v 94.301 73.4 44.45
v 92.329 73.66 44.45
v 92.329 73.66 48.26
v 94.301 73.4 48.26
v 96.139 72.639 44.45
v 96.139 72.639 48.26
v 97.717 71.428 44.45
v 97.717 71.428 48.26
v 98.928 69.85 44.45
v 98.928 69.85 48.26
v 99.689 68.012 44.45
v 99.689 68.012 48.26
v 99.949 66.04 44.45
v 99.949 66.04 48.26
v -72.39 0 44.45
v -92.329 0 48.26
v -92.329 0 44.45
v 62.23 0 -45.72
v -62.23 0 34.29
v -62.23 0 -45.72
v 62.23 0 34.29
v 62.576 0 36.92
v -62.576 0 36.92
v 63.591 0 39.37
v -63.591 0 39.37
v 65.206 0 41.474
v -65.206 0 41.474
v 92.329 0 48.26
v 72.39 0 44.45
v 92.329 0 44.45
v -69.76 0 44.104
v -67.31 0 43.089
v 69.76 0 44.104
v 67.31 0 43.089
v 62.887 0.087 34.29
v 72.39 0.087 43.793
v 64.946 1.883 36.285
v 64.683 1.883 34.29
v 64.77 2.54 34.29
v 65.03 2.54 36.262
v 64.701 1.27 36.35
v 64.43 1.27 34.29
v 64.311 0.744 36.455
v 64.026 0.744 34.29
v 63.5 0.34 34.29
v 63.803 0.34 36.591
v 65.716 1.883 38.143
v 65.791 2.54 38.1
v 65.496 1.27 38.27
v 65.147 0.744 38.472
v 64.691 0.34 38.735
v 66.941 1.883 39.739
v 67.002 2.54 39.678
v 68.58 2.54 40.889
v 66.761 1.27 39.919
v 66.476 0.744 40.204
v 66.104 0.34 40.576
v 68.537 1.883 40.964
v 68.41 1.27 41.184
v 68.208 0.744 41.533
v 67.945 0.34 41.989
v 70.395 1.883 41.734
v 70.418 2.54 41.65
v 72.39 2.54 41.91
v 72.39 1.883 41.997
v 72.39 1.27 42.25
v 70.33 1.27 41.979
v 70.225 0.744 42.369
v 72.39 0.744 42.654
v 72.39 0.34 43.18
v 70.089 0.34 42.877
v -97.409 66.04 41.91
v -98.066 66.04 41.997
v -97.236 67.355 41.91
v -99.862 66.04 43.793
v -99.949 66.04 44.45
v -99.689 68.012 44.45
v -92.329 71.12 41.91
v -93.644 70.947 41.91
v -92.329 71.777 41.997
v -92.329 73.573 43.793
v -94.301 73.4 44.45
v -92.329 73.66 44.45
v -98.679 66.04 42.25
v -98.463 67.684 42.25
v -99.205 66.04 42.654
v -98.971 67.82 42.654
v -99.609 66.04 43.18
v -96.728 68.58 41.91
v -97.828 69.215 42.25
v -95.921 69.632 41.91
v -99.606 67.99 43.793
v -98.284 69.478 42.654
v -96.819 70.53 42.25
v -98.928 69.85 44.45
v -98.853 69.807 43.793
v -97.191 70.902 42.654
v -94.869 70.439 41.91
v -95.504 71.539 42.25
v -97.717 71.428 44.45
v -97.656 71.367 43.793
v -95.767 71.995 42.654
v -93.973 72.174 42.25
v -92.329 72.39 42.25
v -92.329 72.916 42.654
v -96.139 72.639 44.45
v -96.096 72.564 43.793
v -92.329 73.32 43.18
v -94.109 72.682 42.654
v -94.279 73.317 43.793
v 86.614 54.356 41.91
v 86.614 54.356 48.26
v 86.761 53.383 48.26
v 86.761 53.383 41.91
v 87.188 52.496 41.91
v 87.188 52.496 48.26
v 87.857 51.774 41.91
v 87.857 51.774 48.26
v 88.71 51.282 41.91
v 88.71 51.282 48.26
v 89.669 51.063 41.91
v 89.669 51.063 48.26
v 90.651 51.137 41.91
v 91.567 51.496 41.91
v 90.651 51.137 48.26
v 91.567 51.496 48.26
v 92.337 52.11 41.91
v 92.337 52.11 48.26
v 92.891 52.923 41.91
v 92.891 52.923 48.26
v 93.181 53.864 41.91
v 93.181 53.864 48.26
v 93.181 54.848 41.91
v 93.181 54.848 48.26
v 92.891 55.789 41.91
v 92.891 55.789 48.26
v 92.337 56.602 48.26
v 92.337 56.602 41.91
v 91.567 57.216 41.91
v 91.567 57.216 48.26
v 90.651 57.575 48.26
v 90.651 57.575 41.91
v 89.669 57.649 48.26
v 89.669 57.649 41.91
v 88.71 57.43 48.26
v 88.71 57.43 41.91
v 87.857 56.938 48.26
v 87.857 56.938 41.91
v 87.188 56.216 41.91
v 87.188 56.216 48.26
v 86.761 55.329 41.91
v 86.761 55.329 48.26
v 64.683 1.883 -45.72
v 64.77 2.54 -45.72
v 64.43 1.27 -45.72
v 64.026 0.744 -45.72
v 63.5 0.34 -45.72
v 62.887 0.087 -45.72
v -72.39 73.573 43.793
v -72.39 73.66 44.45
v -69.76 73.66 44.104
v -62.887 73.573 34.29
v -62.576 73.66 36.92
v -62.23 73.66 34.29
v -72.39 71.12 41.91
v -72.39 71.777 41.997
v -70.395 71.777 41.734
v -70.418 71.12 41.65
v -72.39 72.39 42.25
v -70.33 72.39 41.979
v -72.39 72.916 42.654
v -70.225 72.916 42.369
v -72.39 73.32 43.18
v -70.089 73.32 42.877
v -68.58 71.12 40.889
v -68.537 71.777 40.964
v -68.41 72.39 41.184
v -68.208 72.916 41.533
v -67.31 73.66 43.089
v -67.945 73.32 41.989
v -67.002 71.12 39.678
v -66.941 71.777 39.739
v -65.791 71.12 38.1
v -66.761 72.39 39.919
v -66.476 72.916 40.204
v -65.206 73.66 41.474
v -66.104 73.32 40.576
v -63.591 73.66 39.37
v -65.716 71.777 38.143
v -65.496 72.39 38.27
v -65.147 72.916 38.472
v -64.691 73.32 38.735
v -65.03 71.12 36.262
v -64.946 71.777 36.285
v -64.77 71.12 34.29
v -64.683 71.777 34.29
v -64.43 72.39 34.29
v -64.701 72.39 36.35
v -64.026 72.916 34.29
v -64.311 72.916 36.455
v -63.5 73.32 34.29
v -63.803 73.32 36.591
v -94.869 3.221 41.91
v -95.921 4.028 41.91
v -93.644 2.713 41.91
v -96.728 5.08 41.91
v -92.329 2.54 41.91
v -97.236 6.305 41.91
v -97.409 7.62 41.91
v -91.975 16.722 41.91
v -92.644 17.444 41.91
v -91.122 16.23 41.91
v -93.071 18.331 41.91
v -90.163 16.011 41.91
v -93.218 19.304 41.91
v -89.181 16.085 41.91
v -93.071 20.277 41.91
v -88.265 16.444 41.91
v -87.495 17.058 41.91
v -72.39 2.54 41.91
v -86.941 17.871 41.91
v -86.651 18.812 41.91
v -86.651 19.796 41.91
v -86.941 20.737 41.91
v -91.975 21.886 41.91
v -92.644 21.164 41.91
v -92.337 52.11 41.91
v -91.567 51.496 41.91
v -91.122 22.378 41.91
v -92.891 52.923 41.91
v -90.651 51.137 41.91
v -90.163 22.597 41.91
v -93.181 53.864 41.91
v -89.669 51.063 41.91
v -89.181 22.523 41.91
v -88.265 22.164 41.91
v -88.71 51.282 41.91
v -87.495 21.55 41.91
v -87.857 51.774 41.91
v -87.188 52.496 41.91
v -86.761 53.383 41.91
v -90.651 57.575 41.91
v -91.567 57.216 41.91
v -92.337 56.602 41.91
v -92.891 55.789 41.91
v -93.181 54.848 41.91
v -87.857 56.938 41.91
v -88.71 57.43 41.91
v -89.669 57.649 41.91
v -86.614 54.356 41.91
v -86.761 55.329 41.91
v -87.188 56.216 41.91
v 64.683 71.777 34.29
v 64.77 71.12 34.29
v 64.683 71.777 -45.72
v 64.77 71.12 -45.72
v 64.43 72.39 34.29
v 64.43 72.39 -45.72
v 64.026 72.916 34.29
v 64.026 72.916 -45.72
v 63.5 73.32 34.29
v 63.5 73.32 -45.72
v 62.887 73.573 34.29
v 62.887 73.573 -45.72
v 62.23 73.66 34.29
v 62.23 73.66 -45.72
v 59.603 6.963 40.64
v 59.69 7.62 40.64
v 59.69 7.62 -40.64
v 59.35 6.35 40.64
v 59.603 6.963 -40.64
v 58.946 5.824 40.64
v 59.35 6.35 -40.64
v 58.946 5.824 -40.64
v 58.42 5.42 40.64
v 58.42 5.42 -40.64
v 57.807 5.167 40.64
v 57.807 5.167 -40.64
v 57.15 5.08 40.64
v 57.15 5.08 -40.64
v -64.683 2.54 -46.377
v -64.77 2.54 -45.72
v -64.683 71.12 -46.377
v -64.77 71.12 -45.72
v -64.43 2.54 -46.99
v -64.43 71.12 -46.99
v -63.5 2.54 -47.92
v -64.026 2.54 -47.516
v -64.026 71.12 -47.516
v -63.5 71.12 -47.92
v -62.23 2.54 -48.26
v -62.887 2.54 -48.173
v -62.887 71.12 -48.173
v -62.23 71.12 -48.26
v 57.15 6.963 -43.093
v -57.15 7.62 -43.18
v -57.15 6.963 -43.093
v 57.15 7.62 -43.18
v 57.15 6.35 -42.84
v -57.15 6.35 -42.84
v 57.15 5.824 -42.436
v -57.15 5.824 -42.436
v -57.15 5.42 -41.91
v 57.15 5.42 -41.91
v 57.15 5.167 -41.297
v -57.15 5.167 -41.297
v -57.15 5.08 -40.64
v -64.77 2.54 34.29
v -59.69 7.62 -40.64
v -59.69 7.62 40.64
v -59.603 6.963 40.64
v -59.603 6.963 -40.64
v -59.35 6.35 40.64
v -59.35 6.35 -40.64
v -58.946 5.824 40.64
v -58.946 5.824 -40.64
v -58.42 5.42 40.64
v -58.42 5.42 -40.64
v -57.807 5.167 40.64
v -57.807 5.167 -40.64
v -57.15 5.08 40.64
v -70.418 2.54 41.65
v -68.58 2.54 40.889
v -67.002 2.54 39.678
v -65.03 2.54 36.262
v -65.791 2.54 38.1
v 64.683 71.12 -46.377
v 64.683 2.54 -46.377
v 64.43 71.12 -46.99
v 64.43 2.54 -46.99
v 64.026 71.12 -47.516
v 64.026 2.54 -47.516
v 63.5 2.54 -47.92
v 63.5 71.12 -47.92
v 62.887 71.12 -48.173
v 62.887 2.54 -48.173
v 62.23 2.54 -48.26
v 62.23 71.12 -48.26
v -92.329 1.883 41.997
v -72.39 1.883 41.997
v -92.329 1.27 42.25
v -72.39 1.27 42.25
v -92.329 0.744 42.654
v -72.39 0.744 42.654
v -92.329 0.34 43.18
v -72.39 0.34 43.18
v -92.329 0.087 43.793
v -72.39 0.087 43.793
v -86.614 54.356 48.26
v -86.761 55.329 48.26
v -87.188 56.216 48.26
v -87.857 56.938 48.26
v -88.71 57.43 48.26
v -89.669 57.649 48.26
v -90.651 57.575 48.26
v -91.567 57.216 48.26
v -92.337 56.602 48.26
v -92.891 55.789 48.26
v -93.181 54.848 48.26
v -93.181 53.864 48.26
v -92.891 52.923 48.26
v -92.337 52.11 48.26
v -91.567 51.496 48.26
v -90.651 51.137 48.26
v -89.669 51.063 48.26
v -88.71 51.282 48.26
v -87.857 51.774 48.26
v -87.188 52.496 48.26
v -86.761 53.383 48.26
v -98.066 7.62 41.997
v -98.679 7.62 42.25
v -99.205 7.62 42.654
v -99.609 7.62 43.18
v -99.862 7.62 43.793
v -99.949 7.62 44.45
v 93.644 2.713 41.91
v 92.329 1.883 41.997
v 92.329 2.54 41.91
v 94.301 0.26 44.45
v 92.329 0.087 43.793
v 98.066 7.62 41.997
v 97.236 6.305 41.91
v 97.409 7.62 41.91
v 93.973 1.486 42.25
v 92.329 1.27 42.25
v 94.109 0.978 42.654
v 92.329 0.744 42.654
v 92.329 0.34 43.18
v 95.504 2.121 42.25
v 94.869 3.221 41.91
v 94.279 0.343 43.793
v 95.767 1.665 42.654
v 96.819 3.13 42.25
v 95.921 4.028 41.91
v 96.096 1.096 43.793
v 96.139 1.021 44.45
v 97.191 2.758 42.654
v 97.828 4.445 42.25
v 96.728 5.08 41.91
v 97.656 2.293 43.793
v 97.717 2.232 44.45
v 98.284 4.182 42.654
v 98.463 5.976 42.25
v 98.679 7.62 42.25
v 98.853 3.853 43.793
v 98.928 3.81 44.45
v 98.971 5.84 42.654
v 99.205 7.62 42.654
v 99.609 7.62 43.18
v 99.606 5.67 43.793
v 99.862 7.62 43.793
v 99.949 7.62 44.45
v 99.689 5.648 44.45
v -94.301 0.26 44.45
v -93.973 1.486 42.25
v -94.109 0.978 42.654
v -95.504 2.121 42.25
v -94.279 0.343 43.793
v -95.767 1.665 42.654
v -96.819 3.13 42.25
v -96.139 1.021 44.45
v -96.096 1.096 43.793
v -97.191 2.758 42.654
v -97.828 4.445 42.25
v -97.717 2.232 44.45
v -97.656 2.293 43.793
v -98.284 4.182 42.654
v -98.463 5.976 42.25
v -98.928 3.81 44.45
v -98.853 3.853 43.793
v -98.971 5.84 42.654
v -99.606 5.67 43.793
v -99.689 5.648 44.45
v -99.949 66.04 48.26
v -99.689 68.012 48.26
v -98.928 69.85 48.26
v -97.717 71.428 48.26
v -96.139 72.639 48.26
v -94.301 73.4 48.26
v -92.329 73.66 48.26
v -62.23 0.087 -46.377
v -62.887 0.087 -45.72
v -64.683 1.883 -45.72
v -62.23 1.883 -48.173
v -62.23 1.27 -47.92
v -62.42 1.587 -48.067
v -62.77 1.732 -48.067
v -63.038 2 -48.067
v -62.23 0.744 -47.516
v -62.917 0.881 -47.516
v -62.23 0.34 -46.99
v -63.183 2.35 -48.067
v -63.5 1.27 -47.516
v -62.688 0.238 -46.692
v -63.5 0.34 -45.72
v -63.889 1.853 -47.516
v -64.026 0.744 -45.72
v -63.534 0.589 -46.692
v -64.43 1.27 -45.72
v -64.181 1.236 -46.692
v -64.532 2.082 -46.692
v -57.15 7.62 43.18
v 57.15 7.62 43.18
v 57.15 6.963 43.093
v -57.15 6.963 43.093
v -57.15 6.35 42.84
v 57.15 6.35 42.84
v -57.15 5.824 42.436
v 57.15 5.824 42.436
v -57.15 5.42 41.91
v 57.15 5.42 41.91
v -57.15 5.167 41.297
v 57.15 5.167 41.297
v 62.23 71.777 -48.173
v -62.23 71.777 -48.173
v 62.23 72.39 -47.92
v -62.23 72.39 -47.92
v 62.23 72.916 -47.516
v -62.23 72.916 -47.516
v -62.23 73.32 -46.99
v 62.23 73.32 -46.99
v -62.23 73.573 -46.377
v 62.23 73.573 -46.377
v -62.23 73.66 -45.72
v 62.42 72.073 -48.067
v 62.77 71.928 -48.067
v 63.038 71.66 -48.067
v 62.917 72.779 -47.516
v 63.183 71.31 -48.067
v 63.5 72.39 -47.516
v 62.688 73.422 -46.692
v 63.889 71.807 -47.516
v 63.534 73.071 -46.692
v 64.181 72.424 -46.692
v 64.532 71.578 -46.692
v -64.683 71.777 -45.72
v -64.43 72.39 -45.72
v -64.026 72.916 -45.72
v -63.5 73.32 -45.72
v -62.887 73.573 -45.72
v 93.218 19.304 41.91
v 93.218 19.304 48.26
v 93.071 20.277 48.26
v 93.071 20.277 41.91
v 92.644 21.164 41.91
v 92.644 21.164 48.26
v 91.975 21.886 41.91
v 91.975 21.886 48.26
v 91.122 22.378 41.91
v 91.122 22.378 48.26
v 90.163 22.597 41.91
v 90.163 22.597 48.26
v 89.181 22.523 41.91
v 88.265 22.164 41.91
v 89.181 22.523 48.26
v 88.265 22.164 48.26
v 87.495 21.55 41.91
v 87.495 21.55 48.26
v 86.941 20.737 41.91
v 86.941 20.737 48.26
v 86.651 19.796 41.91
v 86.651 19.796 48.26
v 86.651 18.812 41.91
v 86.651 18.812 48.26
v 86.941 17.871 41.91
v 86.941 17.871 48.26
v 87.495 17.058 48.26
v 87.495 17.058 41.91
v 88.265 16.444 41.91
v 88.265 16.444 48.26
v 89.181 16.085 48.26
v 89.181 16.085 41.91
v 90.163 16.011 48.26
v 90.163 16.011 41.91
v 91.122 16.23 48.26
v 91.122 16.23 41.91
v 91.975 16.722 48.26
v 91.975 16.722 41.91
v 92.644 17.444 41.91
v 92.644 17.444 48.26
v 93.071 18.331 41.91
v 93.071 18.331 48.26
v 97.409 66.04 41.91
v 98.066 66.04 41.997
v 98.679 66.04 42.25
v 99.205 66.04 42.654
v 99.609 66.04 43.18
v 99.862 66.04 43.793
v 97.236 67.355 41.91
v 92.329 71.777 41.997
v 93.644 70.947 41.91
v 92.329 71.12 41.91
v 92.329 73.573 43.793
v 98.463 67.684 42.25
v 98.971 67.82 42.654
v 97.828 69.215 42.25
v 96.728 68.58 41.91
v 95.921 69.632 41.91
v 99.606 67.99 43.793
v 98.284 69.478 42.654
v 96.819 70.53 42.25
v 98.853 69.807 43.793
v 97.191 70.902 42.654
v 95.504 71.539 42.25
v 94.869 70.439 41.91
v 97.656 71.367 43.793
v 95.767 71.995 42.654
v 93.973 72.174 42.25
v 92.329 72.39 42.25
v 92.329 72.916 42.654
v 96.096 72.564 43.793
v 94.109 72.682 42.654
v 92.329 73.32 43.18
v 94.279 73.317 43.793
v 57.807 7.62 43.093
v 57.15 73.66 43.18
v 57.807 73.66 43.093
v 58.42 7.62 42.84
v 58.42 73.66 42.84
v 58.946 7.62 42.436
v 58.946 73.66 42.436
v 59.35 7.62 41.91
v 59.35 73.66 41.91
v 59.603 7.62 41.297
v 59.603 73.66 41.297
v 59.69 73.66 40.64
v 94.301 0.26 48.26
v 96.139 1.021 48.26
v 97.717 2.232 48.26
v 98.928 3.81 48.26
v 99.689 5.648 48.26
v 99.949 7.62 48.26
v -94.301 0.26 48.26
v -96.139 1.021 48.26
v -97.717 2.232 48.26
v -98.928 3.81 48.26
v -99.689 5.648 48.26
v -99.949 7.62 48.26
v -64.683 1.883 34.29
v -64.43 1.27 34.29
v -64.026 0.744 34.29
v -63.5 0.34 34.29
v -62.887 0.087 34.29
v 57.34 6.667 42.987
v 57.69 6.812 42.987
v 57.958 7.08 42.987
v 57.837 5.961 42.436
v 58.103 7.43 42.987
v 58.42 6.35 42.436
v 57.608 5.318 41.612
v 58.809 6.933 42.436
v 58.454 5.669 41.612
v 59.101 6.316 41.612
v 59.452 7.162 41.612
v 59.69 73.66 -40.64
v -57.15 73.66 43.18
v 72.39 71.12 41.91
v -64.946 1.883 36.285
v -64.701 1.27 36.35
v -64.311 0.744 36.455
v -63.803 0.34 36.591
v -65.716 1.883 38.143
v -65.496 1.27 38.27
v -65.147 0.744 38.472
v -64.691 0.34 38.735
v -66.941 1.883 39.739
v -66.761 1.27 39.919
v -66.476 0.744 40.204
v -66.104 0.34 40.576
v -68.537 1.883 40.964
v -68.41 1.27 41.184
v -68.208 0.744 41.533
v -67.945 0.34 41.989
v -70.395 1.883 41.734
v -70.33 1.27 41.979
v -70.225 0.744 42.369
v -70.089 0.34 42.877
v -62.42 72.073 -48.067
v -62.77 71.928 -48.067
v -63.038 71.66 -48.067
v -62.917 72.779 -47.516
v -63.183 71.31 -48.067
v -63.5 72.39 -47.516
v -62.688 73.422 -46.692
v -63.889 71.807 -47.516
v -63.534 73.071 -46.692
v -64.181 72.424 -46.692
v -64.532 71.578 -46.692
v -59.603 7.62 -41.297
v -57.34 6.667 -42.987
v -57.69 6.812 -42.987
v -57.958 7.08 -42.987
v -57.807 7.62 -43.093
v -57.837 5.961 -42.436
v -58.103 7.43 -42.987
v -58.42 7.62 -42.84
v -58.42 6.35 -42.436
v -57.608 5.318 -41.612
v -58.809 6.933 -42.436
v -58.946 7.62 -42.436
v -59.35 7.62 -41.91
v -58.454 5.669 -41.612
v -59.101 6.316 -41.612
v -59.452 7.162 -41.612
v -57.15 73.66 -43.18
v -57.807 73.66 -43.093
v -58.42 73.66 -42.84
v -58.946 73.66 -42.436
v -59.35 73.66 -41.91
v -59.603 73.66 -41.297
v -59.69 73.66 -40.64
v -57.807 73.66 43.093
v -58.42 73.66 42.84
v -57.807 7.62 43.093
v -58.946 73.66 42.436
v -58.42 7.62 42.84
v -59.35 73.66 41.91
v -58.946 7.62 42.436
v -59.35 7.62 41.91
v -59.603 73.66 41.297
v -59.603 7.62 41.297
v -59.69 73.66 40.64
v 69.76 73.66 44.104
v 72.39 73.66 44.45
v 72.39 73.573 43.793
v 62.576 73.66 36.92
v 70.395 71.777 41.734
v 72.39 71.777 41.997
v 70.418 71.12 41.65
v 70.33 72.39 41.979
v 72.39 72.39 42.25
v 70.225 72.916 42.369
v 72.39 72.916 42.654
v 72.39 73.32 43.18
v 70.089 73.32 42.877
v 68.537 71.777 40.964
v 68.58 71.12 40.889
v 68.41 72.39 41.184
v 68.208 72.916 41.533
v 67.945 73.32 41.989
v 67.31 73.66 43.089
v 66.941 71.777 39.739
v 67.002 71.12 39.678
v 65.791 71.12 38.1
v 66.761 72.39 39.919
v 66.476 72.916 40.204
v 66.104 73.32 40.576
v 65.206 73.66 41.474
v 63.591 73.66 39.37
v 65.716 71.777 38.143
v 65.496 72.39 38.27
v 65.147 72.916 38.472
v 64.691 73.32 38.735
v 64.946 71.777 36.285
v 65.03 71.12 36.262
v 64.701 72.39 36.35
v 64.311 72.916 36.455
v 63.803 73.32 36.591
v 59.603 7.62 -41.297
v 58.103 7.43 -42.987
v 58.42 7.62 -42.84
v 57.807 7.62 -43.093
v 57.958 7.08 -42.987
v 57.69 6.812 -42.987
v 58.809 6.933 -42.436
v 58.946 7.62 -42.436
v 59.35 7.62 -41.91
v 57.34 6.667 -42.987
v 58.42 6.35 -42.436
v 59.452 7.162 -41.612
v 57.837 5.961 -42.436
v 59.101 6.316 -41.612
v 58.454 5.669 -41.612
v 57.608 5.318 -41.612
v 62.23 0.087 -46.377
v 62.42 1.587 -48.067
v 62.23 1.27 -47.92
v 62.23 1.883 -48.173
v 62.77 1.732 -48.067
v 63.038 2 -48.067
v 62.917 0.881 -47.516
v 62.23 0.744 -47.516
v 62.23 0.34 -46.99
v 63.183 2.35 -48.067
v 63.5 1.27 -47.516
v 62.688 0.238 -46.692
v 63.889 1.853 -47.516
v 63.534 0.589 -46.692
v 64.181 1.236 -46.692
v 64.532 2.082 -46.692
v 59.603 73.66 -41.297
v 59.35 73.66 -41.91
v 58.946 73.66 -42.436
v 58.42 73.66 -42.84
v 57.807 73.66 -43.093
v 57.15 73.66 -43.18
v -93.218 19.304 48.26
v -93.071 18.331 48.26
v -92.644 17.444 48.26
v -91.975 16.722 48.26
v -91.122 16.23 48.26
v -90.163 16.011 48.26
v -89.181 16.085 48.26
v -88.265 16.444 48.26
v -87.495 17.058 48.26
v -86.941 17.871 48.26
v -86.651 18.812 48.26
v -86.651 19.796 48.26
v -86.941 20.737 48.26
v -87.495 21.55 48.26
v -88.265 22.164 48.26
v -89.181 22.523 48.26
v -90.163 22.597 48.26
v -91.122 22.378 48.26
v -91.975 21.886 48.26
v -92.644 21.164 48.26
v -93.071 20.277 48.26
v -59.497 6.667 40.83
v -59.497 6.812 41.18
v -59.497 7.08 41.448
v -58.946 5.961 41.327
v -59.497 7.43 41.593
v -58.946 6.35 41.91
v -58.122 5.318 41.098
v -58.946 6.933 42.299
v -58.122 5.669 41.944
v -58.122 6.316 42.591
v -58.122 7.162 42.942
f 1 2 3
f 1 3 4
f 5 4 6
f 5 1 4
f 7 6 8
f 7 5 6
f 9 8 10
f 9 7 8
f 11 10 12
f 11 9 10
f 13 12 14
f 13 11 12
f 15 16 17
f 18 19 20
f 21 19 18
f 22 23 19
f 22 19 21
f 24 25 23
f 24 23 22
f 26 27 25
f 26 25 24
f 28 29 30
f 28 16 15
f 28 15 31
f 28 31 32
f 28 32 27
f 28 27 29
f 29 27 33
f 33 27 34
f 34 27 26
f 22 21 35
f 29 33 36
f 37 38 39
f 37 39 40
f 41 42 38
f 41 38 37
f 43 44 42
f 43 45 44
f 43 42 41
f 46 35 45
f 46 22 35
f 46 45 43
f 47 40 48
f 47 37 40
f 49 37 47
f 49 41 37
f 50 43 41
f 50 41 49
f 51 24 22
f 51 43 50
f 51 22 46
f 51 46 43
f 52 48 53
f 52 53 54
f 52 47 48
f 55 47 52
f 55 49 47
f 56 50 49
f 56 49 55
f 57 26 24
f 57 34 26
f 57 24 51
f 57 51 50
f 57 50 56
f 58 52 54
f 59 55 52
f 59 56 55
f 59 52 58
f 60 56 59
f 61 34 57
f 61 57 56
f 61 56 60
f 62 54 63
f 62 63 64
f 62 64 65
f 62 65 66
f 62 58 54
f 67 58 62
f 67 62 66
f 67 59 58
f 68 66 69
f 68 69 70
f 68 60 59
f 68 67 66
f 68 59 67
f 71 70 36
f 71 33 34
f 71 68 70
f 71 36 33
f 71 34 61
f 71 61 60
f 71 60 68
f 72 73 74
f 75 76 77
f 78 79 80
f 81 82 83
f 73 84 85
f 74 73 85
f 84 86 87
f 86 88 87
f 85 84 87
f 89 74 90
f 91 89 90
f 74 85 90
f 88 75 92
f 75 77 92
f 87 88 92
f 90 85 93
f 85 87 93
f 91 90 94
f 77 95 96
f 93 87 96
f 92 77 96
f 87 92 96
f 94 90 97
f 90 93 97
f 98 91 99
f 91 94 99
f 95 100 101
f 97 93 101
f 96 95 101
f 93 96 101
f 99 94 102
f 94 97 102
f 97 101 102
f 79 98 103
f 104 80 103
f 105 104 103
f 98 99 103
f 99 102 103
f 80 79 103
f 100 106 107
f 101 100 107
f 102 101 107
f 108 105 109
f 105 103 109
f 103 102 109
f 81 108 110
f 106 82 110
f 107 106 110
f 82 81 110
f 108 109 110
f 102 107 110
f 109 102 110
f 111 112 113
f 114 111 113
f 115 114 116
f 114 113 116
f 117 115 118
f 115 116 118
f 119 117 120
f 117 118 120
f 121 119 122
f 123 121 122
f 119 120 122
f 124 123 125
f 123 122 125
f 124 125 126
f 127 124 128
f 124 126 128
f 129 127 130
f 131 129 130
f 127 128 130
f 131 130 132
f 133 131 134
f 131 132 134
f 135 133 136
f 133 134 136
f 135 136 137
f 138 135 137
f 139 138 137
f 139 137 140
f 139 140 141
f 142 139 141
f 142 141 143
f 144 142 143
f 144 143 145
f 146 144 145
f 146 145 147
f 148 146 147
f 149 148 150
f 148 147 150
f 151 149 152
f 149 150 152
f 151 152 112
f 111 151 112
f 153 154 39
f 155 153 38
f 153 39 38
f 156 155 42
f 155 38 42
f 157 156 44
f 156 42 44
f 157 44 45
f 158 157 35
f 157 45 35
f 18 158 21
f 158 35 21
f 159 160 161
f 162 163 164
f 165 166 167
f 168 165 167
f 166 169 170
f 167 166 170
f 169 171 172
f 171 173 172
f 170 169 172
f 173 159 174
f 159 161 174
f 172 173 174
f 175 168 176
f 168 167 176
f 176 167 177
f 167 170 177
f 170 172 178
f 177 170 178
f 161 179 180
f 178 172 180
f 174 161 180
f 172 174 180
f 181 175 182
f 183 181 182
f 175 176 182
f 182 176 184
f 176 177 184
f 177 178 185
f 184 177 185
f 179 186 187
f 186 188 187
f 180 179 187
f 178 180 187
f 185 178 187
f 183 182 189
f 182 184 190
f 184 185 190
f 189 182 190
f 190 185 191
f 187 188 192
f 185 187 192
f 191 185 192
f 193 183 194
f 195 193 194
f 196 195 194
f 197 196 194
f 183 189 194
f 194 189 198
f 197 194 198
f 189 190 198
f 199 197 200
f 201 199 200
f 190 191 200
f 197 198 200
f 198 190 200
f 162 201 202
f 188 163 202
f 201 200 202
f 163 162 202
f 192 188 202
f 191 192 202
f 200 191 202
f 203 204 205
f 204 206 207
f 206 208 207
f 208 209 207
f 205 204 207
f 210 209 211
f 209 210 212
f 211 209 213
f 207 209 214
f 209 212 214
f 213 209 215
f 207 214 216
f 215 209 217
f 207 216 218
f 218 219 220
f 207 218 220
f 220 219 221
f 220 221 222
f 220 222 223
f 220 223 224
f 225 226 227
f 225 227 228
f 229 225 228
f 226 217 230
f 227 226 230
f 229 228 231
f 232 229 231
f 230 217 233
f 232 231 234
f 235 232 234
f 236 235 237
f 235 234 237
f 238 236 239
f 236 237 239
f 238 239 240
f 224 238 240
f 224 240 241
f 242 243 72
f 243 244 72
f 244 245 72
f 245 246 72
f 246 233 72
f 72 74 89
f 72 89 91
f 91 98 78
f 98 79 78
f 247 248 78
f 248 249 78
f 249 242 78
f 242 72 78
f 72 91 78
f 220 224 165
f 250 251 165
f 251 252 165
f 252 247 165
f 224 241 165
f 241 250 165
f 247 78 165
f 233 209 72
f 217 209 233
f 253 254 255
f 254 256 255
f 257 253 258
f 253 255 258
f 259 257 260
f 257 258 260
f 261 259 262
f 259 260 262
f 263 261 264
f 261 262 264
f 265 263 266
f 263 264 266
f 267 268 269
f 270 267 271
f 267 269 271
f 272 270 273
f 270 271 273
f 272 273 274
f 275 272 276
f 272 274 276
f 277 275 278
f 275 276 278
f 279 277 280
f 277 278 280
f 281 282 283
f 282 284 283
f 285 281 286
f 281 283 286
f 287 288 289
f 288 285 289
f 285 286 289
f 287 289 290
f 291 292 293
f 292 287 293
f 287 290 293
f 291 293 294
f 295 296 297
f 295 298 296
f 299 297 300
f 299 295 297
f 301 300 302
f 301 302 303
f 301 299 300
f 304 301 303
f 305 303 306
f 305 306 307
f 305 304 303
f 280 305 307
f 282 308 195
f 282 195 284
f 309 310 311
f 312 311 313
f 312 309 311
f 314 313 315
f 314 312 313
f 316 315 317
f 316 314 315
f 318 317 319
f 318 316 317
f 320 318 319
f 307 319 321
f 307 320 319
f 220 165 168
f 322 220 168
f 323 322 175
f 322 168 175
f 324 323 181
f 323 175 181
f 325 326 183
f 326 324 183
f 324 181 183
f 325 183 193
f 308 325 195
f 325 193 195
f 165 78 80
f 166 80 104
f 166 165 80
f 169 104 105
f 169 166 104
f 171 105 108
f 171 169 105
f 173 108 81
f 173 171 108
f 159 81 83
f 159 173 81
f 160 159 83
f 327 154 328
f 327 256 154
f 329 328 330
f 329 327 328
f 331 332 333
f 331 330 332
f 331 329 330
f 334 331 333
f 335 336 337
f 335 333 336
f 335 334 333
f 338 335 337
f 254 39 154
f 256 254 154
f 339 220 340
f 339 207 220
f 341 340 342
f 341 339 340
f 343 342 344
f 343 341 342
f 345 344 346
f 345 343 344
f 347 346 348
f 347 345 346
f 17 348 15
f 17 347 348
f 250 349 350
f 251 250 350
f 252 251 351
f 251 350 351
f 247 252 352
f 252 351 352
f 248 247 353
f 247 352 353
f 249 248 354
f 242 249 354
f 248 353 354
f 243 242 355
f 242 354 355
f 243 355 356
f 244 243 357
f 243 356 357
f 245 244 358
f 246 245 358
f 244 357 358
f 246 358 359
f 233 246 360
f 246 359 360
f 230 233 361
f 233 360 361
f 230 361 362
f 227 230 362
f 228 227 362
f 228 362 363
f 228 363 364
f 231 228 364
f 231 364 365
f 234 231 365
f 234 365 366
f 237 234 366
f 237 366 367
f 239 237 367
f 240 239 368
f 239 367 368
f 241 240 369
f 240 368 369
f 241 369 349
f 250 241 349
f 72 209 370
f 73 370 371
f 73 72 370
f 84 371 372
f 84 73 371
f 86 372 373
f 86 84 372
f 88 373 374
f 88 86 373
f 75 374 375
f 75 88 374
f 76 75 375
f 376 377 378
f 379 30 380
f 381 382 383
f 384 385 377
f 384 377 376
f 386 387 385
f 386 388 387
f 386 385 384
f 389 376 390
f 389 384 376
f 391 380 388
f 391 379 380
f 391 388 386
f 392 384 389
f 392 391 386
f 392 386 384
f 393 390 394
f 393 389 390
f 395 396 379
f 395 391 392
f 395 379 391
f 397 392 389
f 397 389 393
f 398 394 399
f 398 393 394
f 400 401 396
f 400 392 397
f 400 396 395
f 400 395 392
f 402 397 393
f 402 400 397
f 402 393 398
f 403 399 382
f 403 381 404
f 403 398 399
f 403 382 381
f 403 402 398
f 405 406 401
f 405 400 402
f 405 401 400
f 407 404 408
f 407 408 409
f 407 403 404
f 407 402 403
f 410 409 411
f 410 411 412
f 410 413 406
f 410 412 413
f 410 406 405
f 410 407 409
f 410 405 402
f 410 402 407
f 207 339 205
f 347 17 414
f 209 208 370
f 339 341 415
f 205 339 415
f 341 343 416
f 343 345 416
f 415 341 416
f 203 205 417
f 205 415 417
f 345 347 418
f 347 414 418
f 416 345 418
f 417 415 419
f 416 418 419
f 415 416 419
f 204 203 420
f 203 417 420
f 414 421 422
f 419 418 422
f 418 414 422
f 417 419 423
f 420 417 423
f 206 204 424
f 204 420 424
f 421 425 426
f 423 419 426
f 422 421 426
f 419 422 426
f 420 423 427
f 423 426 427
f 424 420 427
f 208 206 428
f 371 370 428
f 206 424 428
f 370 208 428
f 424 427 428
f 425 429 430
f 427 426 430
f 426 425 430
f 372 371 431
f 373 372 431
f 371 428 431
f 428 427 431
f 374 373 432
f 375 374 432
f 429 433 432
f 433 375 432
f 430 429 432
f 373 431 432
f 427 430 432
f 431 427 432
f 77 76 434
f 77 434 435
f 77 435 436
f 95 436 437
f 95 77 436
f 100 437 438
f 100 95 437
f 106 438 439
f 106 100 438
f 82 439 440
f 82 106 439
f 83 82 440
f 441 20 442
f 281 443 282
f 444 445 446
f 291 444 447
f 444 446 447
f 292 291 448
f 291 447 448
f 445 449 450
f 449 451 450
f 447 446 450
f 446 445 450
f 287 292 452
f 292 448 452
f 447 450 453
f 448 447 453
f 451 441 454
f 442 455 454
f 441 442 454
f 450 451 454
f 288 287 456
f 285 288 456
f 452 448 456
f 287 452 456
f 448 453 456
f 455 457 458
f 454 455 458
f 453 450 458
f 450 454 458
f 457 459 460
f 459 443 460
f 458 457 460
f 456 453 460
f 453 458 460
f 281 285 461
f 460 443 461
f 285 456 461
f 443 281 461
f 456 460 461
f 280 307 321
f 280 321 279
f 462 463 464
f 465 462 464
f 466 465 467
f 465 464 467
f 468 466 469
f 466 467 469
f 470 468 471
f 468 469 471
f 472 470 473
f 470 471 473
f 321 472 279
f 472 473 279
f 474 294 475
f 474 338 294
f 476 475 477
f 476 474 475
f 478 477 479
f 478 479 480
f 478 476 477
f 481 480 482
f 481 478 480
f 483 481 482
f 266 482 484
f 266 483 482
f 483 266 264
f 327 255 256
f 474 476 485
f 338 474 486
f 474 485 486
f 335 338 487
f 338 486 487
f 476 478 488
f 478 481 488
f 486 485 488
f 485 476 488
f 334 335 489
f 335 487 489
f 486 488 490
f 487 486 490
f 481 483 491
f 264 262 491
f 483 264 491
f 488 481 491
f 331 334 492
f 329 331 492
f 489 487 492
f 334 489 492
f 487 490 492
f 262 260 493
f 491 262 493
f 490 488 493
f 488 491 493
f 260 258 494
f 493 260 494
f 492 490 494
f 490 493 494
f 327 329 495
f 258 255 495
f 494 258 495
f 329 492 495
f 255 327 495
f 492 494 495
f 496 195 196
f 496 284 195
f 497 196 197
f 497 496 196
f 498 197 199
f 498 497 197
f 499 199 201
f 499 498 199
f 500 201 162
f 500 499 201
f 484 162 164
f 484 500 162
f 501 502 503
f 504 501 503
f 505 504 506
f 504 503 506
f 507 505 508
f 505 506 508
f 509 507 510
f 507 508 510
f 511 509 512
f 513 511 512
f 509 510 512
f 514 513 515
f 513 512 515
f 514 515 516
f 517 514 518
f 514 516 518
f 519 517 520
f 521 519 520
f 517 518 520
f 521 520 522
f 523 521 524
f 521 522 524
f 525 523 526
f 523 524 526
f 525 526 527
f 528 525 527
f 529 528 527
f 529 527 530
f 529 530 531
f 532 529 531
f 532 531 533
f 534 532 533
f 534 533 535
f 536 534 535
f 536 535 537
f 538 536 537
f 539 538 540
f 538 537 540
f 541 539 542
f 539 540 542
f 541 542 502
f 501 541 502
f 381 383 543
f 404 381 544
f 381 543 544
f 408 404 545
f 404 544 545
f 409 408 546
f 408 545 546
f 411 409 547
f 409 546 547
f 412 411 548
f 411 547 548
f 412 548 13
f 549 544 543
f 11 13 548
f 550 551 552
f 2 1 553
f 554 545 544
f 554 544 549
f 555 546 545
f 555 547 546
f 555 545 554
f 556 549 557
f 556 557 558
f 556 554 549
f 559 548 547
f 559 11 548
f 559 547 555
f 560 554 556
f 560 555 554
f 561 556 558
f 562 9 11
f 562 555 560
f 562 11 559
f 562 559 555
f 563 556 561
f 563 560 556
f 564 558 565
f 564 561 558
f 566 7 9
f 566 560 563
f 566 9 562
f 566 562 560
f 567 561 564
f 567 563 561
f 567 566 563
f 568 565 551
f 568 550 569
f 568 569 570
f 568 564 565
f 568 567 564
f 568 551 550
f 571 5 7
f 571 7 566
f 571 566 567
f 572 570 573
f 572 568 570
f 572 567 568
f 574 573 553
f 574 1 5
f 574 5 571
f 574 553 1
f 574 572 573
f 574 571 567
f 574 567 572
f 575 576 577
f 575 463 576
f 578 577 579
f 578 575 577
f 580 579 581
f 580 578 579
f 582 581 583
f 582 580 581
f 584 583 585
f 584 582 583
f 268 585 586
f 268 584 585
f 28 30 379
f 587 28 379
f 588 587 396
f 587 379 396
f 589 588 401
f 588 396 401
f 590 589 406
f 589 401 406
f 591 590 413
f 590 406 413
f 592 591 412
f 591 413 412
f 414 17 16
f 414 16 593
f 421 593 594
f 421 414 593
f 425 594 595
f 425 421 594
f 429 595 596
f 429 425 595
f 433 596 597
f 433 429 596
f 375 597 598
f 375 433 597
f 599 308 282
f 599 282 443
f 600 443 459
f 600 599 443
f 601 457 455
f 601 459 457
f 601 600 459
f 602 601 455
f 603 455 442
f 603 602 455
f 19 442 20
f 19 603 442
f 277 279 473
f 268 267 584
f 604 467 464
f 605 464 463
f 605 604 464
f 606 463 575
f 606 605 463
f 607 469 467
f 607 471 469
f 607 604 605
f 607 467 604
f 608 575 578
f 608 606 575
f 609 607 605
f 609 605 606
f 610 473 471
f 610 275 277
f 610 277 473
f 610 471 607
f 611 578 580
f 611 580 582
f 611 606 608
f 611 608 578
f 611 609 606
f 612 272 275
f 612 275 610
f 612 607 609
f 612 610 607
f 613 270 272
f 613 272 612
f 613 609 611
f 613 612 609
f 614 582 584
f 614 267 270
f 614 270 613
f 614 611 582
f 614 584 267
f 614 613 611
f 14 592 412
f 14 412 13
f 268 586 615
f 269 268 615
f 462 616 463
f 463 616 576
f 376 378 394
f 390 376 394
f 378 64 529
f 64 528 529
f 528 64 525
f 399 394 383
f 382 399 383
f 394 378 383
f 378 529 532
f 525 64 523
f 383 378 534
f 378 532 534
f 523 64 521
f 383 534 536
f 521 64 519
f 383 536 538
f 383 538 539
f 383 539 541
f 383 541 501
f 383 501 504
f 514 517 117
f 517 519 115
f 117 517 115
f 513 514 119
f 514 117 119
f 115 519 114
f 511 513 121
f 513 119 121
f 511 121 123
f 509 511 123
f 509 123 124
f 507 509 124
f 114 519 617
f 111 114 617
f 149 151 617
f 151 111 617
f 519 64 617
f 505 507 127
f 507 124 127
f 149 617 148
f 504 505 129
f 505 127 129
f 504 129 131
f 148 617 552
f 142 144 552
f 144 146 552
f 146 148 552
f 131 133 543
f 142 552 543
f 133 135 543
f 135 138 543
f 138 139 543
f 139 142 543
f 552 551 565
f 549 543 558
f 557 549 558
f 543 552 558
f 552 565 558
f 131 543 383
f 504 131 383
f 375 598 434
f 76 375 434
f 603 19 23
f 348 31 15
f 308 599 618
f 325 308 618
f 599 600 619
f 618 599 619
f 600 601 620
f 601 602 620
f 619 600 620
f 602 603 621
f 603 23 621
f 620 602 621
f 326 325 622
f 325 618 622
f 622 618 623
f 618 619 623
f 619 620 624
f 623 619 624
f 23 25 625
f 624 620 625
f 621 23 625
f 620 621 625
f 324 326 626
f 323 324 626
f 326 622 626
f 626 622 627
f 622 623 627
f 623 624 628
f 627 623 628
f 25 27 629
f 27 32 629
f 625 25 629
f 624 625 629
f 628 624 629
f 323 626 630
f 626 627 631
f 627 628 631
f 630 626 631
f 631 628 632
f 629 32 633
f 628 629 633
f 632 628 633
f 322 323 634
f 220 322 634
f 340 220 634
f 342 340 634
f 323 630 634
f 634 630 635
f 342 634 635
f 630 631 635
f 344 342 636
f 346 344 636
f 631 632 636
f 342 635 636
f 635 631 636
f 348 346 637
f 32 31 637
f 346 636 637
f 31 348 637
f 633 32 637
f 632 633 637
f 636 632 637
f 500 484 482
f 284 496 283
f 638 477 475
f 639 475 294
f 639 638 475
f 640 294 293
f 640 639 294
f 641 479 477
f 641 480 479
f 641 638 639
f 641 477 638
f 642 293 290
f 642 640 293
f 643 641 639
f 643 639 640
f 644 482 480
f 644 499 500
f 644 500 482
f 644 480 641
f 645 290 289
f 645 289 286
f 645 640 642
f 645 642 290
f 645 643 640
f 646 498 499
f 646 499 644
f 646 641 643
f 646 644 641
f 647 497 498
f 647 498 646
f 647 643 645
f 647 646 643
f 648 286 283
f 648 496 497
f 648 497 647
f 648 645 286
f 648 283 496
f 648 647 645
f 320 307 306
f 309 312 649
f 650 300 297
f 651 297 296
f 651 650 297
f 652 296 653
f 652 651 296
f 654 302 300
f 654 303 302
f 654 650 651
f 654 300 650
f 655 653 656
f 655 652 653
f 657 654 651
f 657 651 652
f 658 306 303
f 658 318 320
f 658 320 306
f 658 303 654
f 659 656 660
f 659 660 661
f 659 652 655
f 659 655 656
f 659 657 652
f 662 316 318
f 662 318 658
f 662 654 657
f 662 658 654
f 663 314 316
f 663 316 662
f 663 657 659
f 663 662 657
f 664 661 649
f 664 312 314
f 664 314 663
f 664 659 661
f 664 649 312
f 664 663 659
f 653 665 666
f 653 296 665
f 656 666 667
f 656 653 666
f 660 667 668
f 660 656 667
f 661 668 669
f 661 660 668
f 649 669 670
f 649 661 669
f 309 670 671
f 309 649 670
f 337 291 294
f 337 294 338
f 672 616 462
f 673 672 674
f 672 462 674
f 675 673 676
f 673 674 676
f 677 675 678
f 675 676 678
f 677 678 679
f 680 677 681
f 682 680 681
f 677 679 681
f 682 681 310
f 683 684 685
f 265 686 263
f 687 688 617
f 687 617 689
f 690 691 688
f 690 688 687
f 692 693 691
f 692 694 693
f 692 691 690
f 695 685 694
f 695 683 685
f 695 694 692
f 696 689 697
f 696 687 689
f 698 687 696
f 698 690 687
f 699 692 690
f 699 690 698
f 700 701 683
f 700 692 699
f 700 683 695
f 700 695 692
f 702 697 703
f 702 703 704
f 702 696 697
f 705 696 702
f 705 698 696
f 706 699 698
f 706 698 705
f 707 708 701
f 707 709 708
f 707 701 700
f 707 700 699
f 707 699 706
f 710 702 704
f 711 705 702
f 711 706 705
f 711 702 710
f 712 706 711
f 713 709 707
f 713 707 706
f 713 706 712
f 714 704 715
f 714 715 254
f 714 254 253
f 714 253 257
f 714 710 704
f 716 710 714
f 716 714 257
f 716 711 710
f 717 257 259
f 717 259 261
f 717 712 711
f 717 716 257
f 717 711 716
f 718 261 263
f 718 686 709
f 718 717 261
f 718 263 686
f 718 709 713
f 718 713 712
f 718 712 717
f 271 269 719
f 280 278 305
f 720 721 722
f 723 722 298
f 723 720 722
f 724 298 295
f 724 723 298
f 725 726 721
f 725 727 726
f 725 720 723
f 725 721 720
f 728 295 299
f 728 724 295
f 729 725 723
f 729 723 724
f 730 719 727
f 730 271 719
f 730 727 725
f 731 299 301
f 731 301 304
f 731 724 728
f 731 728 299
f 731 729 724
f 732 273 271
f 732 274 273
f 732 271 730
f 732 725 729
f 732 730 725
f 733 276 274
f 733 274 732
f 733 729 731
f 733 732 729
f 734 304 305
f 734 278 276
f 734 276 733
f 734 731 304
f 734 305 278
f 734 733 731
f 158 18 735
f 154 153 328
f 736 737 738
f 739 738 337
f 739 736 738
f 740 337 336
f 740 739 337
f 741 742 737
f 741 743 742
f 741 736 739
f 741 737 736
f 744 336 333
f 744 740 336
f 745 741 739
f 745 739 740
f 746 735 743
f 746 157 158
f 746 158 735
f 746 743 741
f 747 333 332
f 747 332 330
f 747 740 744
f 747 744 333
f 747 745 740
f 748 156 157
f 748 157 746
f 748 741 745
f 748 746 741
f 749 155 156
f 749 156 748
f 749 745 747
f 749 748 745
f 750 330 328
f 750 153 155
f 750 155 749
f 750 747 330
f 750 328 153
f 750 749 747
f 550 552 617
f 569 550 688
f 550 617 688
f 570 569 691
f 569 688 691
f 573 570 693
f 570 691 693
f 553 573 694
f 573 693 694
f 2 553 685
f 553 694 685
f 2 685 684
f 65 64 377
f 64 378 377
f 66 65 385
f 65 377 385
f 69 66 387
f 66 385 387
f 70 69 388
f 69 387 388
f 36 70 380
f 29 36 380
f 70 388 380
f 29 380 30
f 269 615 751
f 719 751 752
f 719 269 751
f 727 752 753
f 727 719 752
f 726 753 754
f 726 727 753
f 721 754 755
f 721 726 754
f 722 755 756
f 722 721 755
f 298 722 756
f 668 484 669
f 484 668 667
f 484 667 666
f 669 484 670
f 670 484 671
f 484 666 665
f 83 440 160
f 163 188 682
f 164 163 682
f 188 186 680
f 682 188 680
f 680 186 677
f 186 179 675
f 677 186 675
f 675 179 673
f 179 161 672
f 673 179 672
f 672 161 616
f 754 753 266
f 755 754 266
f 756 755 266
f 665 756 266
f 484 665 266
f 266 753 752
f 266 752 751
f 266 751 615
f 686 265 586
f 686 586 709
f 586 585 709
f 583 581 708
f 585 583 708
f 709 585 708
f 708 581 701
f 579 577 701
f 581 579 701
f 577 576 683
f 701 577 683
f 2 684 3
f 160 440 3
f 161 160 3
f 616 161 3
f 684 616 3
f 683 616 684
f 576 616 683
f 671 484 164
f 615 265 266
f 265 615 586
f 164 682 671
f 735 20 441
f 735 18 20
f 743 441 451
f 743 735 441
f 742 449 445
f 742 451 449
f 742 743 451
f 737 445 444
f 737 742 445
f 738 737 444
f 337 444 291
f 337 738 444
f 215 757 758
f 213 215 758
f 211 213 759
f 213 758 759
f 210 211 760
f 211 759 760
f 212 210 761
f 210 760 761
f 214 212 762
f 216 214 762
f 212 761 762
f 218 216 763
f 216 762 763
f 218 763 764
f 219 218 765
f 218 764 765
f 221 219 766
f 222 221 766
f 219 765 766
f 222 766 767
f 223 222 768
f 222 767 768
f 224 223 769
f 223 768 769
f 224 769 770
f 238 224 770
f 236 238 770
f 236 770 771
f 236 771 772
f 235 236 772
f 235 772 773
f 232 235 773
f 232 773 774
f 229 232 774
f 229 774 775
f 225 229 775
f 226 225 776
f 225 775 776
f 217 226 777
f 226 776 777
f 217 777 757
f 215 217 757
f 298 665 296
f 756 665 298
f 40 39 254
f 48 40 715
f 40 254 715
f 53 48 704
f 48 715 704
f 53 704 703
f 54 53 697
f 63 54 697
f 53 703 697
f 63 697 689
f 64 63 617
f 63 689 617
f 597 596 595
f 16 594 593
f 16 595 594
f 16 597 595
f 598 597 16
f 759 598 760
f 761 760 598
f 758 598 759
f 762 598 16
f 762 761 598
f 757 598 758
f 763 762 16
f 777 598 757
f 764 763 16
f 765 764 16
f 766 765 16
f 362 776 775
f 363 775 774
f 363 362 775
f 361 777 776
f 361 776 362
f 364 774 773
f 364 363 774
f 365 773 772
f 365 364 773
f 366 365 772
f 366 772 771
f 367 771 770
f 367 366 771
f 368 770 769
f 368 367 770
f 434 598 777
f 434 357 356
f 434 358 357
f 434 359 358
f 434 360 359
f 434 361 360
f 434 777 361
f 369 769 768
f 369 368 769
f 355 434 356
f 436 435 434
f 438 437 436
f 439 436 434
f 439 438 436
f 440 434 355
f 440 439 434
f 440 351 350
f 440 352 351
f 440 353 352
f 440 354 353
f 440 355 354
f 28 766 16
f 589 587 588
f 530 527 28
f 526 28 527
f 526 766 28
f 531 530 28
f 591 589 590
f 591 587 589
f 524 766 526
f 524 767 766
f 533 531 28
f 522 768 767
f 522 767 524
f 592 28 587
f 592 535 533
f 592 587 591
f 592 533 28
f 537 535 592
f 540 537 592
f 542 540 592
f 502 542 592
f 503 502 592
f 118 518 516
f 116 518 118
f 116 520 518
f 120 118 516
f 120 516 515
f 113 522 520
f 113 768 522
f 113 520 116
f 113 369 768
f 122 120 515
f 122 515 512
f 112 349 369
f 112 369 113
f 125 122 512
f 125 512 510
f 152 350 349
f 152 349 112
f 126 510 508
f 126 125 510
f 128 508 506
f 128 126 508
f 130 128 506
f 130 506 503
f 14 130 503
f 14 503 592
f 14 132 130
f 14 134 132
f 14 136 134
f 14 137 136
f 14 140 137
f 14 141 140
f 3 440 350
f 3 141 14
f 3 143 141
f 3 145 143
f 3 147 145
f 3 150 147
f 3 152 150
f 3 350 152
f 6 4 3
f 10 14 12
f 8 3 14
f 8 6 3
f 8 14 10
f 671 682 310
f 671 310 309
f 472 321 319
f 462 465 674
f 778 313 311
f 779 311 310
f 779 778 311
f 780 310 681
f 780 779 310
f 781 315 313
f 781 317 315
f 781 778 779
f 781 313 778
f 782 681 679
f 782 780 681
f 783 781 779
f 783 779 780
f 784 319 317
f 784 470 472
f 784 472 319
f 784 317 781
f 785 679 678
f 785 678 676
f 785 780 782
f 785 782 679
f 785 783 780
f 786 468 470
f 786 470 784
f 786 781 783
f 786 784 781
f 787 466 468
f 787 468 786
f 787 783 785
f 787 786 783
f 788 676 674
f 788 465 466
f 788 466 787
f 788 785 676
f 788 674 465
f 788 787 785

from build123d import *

# Parameters (mm, degrees)
SKETCH1_W           = 129.54
SKETCH1_H           = 96.52
BOSS_EXTRUDE1_DEPTH = 73.66
SKETCH2_W           = 119.38
SKETCH2_H           = 86.36
CUT_EXTRUDE1_DEPTH  = 68.58
FILLET1_R           = 2.54
SKETCH3_W           = 35.179
SKETCH3_H           = 73.66
SKETCH3_R           = 3.302
BOSS_EXTRUDE2_DEPTH = 6.35
FILLET2_R           = 7.62
FILLET3_R           = 7.62
FILLET4_R           = 7.62
FILLET5_R           = 2.54


with BuildPart() as part:
    # Sketch1 → Boss-Extrude1 (new body)
    with BuildSketch(Plane(origin=(0, 0, 0), x_dir=(1, 0, 0), z_dir=(0, 1, 0))):
        Rectangle(SKETCH1_W, SKETCH1_H)
    extrude(amount=BOSS_EXTRUDE1_DEPTH)

    # Sketch2 → Cut-Extrude1 (cut)
    with BuildSketch(Plane(origin=(0, 73.66, 0), x_dir=(1, 0, 0), z_dir=(0, 1, 0))):
        Rectangle(SKETCH2_W, SKETCH2_H)
    extrude(amount=-CUT_EXTRUDE1_DEPTH, mode=Mode.SUBTRACT)

    # Fillet1
    fillet1_edges = [part.edges().sort_by_distance(p)[0] for p in [
        (59.69, 5.08, 0),
        (59.69, 39.37, -43.18),
        (0, 5.08, 43.18),
        (59.69, 39.37, 43.18),
        (-59.69, 5.08, 0),
        (-59.69, 39.37, 43.18),
        (0, 5.08, -43.18),
        (-59.69, 39.37, -43.18),
    ]]
    fillet(fillet1_edges, radius=FILLET1_R)

    # Sketch3 → Boss-Extrude2 (add)
    # profile 1 of 2: a face of its own
    with BuildSketch(Plane.XY.offset(48.26)):
        with Locations((-82.3595, 36.83)):
            Rectangle(SKETCH3_W, SKETCH3_H)
        with Locations((-89.916, 54.356)):
            Circle(SKETCH3_R, mode=Mode.SUBTRACT)
        with Locations(Location((-89.916, 19.304, 0), (0, 0, 180))):
            Circle(SKETCH3_R, mode=Mode.SUBTRACT)
    # profile 2 of 2: a face of its own
    with BuildSketch(Plane.XY.offset(48.26)):
        with Locations((82.3595, 36.83)):
            Rectangle(SKETCH3_W, SKETCH3_H)
        with Locations((89.916, 19.304)):
            Circle(SKETCH3_R, mode=Mode.SUBTRACT)
        with Locations(Location((89.916, 54.356, 0), (0, 0, 180))):
            Circle(SKETCH3_R, mode=Mode.SUBTRACT)
    extrude(amount=-BOSS_EXTRUDE2_DEPTH)

    # Fillet2
    fillet2_edges = [part.edges().sort_by_distance(p)[0] for p in [
        (-64.77, 36.83, 41.91),
        (64.77, 36.83, 41.91),
    ]]
    fillet(fillet2_edges, radius=FILLET2_R)

    # Fillet3
    fillet3_edges = [part.edges().sort_by_distance(p)[0] for p in [
        (-99.949, 73.66, 45.085),
        (-99.949, 0, 45.085),
    ]]
    fillet(fillet3_edges, radius=FILLET3_R)

    # Fillet4
    fillet4_edges = [part.edges().sort_by_distance(p)[0] for p in [
        (99.949, 73.66, 45.085),
        (99.949, 0, 45.085),
    ]]
    fillet(fillet4_edges, radius=FILLET4_R)

    # Fillet5
    fillet5_edges = [part.edges().sort_by_distance(p)[0] for p in [
        (-64.77, 73.66, -6.985),
        (-99.949, 36.83, 41.91),
        (-82.3595, 0, 41.91),
        (-97.717153673, 2.231846327, 41.91),
        (-97.717153673, 71.428153673, 41.91),
        (99.949, 36.83, 41.91),
        (82.3595, 73.66, 41.91),
        (97.717153673, 2.231846327, 41.91),
        (97.717153673, 71.428153673, 41.91),
        (-64.77, 0, -6.985),
        (0, 0, -48.26),
        (0, 73.66, -48.26),
        (-64.77, 36.83, -48.26),
        (64.77, 36.83, -48.26),
        (64.77, 73.66, -6.985),
        (64.77, 0, -6.985),
        (82.3595, 0, 41.91),
        (-82.3595, 73.66, 41.91),
        (67.001846327, 0, 39.678153673),
        (67.001846327, 73.66, 39.678153673),
        (-67.001846327, 73.66, 39.678153673),
        (-67.001846327, 0, 39.678153673),
    ]]
    fillet(fillet5_edges, radius=FILLET5_R)


solid = part.part
